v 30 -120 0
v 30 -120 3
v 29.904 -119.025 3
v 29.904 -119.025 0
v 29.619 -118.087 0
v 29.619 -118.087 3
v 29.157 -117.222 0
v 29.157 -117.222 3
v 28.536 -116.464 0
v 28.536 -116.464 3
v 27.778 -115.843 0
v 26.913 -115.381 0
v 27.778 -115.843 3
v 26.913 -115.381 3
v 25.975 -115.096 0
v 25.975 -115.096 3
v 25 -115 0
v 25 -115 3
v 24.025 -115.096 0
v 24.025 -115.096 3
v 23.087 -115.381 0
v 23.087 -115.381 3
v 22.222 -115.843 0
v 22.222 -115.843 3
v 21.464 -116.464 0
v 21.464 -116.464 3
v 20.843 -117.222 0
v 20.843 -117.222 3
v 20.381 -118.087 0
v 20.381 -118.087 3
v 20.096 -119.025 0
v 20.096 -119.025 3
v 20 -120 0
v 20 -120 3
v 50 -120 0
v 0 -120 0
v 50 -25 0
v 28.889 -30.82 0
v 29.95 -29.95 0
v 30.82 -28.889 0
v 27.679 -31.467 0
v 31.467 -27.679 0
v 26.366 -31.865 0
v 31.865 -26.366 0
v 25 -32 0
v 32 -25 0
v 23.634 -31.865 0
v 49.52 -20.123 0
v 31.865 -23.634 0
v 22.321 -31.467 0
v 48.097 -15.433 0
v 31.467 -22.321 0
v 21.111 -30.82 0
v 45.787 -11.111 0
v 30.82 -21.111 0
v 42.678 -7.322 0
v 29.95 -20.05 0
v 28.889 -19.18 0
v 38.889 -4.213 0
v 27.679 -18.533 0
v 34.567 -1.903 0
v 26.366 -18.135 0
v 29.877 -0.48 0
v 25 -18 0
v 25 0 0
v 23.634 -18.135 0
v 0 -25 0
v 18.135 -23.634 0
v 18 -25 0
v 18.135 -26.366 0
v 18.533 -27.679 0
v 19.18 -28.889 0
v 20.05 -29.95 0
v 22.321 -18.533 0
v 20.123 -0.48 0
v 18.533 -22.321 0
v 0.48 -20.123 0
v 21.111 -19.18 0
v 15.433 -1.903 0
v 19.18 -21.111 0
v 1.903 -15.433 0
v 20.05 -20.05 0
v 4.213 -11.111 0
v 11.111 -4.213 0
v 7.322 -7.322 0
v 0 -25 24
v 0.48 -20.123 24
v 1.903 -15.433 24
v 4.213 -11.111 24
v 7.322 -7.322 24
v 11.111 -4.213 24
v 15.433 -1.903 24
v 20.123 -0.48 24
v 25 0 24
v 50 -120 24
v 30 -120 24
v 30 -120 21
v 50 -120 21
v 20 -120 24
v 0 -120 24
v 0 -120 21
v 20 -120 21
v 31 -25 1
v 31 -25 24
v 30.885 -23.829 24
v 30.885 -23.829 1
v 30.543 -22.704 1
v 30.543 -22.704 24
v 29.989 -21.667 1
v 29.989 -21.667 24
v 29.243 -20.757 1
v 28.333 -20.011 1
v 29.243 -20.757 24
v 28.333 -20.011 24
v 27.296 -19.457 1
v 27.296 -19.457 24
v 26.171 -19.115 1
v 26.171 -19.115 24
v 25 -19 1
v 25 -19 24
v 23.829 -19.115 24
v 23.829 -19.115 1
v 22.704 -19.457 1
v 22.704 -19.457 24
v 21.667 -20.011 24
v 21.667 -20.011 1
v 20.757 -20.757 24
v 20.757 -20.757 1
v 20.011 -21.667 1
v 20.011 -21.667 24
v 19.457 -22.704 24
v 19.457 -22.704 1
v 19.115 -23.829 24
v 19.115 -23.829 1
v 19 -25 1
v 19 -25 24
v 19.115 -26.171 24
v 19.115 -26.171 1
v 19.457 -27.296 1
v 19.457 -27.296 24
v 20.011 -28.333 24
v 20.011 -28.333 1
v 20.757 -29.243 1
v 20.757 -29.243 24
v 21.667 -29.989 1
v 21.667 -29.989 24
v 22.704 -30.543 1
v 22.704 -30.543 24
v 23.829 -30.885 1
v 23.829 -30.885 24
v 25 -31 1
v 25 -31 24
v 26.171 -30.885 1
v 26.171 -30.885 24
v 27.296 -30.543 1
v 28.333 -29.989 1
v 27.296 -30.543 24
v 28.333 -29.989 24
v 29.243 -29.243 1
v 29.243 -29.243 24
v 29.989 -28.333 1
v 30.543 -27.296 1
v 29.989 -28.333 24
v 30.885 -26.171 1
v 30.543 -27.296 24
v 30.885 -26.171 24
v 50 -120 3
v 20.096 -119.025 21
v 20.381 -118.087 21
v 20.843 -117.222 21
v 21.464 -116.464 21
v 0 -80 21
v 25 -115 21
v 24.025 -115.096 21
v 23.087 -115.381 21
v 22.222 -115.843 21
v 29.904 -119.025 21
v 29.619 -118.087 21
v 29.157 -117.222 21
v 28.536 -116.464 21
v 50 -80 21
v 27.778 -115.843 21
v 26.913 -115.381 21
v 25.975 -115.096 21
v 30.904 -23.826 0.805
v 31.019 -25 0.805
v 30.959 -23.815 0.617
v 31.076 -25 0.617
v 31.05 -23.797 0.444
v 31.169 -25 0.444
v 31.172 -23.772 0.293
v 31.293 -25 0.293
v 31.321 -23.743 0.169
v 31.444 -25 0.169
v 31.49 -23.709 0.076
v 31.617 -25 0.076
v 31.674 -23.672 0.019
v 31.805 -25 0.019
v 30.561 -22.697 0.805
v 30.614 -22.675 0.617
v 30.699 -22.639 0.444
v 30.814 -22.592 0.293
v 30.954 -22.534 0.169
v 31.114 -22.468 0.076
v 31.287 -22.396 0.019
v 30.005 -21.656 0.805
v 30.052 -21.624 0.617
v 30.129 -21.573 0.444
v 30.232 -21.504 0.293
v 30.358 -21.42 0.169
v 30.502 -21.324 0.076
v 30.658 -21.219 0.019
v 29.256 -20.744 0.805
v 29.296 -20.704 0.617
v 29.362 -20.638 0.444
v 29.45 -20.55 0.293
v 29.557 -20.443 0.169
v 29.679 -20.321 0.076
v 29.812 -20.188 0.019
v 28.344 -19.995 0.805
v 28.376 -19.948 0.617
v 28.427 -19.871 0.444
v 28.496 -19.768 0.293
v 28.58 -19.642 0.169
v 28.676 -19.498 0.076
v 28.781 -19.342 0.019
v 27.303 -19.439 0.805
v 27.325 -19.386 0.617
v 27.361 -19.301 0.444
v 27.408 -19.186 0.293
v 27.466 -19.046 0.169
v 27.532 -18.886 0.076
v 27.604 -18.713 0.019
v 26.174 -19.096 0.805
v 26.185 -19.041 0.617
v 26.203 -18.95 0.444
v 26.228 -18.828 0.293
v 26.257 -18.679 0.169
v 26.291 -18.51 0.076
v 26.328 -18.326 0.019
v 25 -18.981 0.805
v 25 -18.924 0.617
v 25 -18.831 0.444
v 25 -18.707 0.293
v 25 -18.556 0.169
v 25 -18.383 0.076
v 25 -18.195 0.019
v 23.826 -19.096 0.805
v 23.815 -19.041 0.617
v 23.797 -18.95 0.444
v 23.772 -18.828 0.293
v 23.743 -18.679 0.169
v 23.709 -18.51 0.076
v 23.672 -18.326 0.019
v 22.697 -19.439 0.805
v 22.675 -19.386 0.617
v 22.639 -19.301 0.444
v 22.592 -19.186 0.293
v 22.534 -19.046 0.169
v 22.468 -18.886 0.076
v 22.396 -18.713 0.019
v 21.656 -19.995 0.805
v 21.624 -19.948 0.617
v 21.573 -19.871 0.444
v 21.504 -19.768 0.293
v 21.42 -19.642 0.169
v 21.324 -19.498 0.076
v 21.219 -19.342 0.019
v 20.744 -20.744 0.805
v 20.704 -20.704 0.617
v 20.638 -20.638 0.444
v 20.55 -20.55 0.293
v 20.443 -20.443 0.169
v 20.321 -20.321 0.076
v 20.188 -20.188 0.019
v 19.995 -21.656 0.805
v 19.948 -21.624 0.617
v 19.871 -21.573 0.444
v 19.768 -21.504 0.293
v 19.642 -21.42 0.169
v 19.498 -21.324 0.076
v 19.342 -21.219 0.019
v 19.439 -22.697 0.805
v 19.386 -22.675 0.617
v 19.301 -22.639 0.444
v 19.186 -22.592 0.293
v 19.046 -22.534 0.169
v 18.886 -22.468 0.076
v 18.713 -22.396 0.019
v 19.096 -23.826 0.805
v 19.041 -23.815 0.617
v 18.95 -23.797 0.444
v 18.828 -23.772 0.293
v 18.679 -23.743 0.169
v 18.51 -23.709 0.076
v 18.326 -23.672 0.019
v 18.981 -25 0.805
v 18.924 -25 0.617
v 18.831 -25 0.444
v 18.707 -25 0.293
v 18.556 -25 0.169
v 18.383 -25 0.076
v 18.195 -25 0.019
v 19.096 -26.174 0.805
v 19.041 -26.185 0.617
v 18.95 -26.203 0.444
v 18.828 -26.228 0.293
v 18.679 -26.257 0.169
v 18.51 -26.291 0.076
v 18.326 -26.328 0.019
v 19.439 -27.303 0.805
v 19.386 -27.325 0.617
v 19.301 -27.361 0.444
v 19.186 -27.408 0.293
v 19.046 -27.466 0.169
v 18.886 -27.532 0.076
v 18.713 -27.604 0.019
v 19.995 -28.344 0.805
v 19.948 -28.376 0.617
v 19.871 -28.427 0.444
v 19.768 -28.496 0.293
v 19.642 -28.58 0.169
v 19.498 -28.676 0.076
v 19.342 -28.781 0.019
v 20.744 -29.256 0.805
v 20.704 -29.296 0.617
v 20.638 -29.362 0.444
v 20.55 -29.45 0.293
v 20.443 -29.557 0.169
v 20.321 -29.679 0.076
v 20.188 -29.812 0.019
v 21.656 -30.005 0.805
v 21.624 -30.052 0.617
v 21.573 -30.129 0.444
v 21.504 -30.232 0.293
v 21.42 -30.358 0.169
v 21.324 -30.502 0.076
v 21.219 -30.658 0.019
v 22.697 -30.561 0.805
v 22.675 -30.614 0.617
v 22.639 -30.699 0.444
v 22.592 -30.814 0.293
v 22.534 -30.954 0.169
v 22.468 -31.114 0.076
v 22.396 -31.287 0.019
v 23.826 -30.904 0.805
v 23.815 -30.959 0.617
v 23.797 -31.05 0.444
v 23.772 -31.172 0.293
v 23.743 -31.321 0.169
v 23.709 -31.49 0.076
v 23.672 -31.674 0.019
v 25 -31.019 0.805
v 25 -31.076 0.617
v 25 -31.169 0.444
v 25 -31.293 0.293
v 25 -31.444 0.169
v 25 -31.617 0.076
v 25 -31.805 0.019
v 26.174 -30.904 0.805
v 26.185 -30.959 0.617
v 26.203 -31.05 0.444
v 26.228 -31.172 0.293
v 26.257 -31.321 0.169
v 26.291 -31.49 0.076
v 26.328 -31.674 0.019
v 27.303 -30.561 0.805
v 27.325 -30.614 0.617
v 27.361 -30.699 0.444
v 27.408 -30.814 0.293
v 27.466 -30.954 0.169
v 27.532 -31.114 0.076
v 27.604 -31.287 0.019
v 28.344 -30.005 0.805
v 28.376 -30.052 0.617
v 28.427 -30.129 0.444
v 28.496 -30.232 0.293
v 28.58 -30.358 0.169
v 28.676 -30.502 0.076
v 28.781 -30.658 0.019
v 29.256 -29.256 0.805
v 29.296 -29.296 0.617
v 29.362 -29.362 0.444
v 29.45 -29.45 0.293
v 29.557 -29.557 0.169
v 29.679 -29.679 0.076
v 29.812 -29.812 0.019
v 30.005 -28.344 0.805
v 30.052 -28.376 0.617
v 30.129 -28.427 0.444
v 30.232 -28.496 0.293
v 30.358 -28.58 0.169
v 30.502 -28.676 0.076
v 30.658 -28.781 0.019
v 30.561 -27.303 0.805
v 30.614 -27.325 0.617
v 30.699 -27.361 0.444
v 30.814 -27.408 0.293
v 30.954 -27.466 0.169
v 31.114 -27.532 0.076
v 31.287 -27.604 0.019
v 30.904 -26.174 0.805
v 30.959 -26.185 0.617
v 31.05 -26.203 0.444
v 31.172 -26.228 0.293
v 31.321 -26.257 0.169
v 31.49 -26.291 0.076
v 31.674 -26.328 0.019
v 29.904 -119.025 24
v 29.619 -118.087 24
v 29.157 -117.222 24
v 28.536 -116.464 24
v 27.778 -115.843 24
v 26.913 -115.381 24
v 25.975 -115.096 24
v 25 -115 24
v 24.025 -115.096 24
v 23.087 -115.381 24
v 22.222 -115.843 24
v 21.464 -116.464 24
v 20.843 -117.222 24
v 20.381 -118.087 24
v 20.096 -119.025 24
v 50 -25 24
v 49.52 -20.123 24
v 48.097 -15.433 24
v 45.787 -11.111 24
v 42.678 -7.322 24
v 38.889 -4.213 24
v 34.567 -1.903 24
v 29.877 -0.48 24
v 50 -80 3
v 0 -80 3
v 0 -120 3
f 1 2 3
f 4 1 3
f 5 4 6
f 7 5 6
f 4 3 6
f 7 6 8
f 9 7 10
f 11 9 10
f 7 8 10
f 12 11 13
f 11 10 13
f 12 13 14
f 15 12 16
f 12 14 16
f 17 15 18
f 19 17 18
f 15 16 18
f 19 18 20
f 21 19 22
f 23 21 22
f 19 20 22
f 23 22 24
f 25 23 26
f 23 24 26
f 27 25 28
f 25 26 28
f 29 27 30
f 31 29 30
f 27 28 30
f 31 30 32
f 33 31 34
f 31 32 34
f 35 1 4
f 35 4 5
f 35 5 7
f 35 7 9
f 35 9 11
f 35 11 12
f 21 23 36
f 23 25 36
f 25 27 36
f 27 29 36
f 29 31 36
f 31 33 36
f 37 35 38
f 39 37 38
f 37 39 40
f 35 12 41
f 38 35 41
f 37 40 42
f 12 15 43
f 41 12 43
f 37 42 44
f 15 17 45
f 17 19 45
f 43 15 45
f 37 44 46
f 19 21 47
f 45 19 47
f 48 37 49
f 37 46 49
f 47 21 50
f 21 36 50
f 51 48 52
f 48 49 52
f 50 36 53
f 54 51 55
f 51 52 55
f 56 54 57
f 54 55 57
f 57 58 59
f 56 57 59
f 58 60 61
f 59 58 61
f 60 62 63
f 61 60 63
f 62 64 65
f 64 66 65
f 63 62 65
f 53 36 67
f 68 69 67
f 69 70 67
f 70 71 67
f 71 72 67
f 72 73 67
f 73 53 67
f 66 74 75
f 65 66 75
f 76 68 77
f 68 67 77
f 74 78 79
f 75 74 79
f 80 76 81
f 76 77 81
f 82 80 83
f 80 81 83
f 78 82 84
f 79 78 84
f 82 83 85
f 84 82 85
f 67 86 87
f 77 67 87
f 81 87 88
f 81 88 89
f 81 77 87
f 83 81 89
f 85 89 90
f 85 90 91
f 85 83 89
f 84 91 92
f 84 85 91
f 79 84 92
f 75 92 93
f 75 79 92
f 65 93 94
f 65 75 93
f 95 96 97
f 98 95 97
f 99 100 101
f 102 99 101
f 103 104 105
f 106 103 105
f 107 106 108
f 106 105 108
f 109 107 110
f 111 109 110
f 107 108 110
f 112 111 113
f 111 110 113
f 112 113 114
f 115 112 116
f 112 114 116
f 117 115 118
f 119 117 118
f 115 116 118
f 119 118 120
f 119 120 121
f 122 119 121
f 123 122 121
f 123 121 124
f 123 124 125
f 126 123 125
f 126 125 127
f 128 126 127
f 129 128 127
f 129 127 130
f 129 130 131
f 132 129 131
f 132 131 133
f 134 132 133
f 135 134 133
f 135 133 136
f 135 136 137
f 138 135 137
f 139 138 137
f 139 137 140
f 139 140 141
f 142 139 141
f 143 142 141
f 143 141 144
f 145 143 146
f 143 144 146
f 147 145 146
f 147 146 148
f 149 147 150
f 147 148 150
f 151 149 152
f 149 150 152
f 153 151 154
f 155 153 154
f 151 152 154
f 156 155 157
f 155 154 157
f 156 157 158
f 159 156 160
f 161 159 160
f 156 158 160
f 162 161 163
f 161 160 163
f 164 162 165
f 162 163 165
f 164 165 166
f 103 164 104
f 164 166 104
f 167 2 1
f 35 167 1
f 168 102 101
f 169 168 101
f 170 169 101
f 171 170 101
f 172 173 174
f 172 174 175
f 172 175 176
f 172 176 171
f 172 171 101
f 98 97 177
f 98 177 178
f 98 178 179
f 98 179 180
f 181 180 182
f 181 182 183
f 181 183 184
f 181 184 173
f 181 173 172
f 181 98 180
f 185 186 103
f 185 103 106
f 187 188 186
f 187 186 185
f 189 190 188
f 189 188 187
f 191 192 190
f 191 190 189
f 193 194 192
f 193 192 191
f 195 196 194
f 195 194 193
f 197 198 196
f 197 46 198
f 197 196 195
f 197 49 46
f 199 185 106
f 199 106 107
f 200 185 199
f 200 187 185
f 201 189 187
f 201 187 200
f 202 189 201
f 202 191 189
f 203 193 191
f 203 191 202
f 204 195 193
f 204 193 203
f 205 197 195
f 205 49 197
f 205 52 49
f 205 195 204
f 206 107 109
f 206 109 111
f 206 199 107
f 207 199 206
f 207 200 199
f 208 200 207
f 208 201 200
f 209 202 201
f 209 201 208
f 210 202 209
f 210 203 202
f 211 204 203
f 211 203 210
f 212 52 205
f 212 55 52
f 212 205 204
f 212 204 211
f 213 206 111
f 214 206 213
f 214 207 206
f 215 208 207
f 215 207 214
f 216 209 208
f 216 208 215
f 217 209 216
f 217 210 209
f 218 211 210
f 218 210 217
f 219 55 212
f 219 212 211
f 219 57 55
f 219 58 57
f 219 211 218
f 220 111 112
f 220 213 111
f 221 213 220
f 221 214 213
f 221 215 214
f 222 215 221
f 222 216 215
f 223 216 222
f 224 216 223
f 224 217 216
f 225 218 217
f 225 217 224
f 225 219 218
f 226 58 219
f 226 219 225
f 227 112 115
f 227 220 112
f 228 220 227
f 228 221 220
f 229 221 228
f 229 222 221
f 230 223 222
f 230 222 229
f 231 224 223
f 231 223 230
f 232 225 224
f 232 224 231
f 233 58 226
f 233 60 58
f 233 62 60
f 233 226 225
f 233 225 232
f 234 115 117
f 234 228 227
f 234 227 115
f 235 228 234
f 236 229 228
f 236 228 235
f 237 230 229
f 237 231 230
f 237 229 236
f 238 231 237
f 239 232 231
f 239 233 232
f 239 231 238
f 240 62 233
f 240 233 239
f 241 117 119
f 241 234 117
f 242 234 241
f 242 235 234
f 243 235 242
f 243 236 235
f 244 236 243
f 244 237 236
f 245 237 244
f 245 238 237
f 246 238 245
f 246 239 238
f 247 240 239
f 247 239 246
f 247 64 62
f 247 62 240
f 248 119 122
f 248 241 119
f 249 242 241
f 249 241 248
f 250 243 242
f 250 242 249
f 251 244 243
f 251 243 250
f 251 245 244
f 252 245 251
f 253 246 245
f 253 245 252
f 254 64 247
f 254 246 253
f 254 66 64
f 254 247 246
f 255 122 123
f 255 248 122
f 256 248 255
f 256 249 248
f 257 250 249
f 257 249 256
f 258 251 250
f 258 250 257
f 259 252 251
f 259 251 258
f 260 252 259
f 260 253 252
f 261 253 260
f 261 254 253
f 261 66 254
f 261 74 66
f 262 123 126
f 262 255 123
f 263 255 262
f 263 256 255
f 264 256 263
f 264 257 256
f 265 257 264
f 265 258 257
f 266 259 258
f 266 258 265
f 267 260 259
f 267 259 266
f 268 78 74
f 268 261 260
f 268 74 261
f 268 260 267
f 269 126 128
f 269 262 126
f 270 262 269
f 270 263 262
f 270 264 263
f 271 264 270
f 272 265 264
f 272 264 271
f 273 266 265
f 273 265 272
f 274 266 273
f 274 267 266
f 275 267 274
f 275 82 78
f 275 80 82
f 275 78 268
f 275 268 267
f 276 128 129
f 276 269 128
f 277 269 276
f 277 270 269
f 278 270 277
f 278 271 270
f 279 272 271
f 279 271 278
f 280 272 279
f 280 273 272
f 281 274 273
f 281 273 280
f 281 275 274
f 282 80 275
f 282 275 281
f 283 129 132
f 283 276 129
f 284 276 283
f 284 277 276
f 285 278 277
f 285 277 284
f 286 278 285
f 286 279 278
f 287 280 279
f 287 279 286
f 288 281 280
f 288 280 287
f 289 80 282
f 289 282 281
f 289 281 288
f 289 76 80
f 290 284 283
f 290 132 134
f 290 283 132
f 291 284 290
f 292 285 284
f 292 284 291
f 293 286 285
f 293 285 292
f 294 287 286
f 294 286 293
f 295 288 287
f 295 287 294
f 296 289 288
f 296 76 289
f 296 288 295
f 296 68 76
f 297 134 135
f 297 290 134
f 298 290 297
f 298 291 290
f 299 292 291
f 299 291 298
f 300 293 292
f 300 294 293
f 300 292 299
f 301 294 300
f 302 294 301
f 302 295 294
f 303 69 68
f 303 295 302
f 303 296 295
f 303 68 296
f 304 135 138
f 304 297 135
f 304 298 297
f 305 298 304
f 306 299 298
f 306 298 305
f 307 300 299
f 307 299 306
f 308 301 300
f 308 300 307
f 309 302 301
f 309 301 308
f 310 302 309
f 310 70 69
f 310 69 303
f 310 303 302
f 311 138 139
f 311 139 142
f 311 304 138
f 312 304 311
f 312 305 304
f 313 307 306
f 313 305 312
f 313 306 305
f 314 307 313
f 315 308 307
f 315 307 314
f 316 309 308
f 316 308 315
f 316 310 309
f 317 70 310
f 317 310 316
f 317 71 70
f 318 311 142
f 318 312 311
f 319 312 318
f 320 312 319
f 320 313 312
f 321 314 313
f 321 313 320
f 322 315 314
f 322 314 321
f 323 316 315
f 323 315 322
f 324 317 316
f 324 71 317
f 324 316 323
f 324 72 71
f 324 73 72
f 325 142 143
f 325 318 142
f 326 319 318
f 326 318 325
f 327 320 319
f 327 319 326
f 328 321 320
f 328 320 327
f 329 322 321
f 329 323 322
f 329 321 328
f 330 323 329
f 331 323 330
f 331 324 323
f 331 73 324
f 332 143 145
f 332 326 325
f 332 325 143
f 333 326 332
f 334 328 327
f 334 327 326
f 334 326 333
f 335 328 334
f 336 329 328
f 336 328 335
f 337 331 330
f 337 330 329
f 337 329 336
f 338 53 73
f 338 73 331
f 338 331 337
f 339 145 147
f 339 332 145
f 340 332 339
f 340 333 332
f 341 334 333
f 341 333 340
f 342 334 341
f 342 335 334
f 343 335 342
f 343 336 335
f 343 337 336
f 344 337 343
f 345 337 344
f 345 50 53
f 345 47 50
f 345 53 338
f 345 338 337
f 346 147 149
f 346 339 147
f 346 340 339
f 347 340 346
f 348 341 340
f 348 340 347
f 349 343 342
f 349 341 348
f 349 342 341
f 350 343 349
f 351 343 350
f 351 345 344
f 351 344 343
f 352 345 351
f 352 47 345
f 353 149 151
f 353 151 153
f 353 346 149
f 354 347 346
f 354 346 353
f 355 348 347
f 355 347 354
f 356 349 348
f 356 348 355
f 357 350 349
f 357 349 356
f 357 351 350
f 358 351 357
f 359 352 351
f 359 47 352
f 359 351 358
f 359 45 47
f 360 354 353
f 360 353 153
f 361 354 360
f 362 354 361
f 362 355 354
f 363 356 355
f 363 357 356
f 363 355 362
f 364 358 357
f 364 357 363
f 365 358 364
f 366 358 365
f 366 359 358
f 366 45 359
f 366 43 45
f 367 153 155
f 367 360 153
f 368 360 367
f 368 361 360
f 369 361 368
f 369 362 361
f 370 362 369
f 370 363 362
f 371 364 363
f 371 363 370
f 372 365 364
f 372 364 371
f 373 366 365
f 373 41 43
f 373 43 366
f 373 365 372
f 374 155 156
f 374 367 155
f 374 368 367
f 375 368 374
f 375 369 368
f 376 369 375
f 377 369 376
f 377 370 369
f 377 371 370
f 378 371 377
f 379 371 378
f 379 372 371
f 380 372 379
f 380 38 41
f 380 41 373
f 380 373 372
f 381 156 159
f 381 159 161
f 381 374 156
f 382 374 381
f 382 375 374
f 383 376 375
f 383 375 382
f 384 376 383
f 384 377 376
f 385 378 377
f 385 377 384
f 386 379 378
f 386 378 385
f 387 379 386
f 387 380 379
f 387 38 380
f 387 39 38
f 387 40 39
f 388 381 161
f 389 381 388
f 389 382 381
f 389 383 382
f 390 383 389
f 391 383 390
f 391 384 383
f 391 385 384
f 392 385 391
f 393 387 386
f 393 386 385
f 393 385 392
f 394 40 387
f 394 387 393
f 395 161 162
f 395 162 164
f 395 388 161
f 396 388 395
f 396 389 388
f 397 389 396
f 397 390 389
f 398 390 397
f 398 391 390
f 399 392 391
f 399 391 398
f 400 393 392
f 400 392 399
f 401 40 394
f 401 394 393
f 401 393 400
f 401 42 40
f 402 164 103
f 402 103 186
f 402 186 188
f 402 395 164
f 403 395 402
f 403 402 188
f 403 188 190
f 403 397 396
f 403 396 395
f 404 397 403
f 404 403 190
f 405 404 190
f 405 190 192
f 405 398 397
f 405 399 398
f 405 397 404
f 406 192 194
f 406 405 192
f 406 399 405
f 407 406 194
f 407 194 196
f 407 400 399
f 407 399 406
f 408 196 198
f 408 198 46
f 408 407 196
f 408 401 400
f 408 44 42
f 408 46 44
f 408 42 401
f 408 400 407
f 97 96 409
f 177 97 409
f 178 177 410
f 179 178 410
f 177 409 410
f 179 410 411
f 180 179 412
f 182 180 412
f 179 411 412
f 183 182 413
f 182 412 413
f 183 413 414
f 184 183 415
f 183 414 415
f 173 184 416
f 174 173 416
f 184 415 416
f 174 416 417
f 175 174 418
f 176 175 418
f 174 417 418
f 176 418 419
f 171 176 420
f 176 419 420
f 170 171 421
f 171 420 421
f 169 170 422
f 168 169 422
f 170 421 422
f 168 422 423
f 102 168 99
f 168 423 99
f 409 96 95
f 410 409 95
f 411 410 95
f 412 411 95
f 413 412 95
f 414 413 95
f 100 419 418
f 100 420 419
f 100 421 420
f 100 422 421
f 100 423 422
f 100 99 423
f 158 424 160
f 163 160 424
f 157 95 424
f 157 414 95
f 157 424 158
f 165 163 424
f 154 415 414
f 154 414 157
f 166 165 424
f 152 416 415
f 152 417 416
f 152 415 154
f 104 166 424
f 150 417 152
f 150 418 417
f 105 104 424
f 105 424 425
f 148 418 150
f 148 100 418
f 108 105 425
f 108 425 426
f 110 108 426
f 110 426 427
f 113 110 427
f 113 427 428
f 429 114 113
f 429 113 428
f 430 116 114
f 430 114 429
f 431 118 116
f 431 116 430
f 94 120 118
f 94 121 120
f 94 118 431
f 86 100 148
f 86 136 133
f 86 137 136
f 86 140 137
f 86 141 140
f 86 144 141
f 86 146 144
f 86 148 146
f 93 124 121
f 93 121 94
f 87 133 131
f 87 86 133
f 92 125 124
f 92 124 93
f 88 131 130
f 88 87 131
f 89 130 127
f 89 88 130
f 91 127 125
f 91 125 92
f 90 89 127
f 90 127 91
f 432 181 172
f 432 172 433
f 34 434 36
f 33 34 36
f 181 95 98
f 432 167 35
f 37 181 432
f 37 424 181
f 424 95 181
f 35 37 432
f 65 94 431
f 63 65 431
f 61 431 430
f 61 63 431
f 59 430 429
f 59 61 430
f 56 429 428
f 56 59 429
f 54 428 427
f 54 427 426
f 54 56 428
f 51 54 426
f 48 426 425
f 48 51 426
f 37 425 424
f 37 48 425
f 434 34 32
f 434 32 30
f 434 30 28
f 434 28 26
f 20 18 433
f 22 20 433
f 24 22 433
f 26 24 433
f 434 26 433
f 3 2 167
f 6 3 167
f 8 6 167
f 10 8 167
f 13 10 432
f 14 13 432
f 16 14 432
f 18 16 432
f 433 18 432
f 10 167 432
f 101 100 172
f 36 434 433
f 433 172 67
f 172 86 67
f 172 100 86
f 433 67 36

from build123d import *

# Parameters (mm, degrees)
SKETCH1_W           = 24
SKETCH1_H           = 120
BOSS_EXTRUDE1_DEPTH = 50
SKETCH3_R           = 6
CUT_EXTRUDE1_DEPTH  = 133.196822957
SKETCH5_R           = 5
CUT_EXTRUDE4_DEPTH  = 133.196822957
SKETCH4_W           = 18
SKETCH4_H           = 80
CUT_EXTRUDE5_DEPTH  = 133.196822957
CUT_EXTRUDE7_START  = -24
CUT_EXTRUDE7_DEPTH  = 24
FILLET2_R           = 1


# Read off the part's stored shape, not the designer's step: Cut-Extrude7
with BuildPart() as part:
    # Sketch1 → Boss-Extrude1 (new body)
    with BuildSketch(Plane(origin=(0, 0, 0), x_dir=(0, 0, -1), z_dir=(1, 0, 0))):
        with Locations((-12, -60)):
            Rectangle(SKETCH1_W, SKETCH1_H)
    extrude(amount=BOSS_EXTRUDE1_DEPTH)

    # Sketch3 → Cut-Extrude1 (cut, through all)
    with BuildSketch(Plane.XY.offset(24)):
        with Locations((25, -25)):
            Circle(SKETCH3_R)
    extrude(amount=-CUT_EXTRUDE1_DEPTH, mode=Mode.SUBTRACT)

    # Sketch5 → Cut-Extrude4 (cut, through all)
    with BuildSketch(Plane.XY.offset(24)):
        with Locations((25, -120)):
            Circle(SKETCH5_R)
    extrude(amount=-CUT_EXTRUDE4_DEPTH, mode=Mode.SUBTRACT)

    # Sketch4 → Cut-Extrude5 (cut, through all)
    with BuildSketch(Plane(origin=(50, 0, 0), x_dir=(0, 0, -1), z_dir=(1, 0, 0))):
        with Locations((-12, -120)):
            Rectangle(SKETCH4_W, SKETCH4_H)
    extrude(amount=-CUT_EXTRUDE5_DEPTH, mode=Mode.SUBTRACT)

    # Cut-Extrude7 outline → Cut-Extrude7 (cut)
    with BuildSketch(Plane.XY.offset(24).offset(CUT_EXTRUDE7_START)):
        with BuildLine():
            Line((0, 0), (0, -25))
            ThreePointArc((0, -25), (7.32233047, -7.32233047), (25, 0))
            Line((25, 0), (0, 0))
        make_face()
        with BuildLine():
            Line((50, 0), (25, 0))
            ThreePointArc((25, 0), (42.67766953, -7.32233047), (50, -25))
            Line((50, -25), (50, 0))
        make_face()
    extrude(amount=CUT_EXTRUDE7_DEPTH, mode=Mode.SUBTRACT)

    # Fillet2
    fillet2_edges = [part.edges().sort_by_distance(p)[0] for p in [
        (19, -25, 0),
    ]]
    fillet(fillet2_edges, radius=FILLET2_R)


solid = part.part
